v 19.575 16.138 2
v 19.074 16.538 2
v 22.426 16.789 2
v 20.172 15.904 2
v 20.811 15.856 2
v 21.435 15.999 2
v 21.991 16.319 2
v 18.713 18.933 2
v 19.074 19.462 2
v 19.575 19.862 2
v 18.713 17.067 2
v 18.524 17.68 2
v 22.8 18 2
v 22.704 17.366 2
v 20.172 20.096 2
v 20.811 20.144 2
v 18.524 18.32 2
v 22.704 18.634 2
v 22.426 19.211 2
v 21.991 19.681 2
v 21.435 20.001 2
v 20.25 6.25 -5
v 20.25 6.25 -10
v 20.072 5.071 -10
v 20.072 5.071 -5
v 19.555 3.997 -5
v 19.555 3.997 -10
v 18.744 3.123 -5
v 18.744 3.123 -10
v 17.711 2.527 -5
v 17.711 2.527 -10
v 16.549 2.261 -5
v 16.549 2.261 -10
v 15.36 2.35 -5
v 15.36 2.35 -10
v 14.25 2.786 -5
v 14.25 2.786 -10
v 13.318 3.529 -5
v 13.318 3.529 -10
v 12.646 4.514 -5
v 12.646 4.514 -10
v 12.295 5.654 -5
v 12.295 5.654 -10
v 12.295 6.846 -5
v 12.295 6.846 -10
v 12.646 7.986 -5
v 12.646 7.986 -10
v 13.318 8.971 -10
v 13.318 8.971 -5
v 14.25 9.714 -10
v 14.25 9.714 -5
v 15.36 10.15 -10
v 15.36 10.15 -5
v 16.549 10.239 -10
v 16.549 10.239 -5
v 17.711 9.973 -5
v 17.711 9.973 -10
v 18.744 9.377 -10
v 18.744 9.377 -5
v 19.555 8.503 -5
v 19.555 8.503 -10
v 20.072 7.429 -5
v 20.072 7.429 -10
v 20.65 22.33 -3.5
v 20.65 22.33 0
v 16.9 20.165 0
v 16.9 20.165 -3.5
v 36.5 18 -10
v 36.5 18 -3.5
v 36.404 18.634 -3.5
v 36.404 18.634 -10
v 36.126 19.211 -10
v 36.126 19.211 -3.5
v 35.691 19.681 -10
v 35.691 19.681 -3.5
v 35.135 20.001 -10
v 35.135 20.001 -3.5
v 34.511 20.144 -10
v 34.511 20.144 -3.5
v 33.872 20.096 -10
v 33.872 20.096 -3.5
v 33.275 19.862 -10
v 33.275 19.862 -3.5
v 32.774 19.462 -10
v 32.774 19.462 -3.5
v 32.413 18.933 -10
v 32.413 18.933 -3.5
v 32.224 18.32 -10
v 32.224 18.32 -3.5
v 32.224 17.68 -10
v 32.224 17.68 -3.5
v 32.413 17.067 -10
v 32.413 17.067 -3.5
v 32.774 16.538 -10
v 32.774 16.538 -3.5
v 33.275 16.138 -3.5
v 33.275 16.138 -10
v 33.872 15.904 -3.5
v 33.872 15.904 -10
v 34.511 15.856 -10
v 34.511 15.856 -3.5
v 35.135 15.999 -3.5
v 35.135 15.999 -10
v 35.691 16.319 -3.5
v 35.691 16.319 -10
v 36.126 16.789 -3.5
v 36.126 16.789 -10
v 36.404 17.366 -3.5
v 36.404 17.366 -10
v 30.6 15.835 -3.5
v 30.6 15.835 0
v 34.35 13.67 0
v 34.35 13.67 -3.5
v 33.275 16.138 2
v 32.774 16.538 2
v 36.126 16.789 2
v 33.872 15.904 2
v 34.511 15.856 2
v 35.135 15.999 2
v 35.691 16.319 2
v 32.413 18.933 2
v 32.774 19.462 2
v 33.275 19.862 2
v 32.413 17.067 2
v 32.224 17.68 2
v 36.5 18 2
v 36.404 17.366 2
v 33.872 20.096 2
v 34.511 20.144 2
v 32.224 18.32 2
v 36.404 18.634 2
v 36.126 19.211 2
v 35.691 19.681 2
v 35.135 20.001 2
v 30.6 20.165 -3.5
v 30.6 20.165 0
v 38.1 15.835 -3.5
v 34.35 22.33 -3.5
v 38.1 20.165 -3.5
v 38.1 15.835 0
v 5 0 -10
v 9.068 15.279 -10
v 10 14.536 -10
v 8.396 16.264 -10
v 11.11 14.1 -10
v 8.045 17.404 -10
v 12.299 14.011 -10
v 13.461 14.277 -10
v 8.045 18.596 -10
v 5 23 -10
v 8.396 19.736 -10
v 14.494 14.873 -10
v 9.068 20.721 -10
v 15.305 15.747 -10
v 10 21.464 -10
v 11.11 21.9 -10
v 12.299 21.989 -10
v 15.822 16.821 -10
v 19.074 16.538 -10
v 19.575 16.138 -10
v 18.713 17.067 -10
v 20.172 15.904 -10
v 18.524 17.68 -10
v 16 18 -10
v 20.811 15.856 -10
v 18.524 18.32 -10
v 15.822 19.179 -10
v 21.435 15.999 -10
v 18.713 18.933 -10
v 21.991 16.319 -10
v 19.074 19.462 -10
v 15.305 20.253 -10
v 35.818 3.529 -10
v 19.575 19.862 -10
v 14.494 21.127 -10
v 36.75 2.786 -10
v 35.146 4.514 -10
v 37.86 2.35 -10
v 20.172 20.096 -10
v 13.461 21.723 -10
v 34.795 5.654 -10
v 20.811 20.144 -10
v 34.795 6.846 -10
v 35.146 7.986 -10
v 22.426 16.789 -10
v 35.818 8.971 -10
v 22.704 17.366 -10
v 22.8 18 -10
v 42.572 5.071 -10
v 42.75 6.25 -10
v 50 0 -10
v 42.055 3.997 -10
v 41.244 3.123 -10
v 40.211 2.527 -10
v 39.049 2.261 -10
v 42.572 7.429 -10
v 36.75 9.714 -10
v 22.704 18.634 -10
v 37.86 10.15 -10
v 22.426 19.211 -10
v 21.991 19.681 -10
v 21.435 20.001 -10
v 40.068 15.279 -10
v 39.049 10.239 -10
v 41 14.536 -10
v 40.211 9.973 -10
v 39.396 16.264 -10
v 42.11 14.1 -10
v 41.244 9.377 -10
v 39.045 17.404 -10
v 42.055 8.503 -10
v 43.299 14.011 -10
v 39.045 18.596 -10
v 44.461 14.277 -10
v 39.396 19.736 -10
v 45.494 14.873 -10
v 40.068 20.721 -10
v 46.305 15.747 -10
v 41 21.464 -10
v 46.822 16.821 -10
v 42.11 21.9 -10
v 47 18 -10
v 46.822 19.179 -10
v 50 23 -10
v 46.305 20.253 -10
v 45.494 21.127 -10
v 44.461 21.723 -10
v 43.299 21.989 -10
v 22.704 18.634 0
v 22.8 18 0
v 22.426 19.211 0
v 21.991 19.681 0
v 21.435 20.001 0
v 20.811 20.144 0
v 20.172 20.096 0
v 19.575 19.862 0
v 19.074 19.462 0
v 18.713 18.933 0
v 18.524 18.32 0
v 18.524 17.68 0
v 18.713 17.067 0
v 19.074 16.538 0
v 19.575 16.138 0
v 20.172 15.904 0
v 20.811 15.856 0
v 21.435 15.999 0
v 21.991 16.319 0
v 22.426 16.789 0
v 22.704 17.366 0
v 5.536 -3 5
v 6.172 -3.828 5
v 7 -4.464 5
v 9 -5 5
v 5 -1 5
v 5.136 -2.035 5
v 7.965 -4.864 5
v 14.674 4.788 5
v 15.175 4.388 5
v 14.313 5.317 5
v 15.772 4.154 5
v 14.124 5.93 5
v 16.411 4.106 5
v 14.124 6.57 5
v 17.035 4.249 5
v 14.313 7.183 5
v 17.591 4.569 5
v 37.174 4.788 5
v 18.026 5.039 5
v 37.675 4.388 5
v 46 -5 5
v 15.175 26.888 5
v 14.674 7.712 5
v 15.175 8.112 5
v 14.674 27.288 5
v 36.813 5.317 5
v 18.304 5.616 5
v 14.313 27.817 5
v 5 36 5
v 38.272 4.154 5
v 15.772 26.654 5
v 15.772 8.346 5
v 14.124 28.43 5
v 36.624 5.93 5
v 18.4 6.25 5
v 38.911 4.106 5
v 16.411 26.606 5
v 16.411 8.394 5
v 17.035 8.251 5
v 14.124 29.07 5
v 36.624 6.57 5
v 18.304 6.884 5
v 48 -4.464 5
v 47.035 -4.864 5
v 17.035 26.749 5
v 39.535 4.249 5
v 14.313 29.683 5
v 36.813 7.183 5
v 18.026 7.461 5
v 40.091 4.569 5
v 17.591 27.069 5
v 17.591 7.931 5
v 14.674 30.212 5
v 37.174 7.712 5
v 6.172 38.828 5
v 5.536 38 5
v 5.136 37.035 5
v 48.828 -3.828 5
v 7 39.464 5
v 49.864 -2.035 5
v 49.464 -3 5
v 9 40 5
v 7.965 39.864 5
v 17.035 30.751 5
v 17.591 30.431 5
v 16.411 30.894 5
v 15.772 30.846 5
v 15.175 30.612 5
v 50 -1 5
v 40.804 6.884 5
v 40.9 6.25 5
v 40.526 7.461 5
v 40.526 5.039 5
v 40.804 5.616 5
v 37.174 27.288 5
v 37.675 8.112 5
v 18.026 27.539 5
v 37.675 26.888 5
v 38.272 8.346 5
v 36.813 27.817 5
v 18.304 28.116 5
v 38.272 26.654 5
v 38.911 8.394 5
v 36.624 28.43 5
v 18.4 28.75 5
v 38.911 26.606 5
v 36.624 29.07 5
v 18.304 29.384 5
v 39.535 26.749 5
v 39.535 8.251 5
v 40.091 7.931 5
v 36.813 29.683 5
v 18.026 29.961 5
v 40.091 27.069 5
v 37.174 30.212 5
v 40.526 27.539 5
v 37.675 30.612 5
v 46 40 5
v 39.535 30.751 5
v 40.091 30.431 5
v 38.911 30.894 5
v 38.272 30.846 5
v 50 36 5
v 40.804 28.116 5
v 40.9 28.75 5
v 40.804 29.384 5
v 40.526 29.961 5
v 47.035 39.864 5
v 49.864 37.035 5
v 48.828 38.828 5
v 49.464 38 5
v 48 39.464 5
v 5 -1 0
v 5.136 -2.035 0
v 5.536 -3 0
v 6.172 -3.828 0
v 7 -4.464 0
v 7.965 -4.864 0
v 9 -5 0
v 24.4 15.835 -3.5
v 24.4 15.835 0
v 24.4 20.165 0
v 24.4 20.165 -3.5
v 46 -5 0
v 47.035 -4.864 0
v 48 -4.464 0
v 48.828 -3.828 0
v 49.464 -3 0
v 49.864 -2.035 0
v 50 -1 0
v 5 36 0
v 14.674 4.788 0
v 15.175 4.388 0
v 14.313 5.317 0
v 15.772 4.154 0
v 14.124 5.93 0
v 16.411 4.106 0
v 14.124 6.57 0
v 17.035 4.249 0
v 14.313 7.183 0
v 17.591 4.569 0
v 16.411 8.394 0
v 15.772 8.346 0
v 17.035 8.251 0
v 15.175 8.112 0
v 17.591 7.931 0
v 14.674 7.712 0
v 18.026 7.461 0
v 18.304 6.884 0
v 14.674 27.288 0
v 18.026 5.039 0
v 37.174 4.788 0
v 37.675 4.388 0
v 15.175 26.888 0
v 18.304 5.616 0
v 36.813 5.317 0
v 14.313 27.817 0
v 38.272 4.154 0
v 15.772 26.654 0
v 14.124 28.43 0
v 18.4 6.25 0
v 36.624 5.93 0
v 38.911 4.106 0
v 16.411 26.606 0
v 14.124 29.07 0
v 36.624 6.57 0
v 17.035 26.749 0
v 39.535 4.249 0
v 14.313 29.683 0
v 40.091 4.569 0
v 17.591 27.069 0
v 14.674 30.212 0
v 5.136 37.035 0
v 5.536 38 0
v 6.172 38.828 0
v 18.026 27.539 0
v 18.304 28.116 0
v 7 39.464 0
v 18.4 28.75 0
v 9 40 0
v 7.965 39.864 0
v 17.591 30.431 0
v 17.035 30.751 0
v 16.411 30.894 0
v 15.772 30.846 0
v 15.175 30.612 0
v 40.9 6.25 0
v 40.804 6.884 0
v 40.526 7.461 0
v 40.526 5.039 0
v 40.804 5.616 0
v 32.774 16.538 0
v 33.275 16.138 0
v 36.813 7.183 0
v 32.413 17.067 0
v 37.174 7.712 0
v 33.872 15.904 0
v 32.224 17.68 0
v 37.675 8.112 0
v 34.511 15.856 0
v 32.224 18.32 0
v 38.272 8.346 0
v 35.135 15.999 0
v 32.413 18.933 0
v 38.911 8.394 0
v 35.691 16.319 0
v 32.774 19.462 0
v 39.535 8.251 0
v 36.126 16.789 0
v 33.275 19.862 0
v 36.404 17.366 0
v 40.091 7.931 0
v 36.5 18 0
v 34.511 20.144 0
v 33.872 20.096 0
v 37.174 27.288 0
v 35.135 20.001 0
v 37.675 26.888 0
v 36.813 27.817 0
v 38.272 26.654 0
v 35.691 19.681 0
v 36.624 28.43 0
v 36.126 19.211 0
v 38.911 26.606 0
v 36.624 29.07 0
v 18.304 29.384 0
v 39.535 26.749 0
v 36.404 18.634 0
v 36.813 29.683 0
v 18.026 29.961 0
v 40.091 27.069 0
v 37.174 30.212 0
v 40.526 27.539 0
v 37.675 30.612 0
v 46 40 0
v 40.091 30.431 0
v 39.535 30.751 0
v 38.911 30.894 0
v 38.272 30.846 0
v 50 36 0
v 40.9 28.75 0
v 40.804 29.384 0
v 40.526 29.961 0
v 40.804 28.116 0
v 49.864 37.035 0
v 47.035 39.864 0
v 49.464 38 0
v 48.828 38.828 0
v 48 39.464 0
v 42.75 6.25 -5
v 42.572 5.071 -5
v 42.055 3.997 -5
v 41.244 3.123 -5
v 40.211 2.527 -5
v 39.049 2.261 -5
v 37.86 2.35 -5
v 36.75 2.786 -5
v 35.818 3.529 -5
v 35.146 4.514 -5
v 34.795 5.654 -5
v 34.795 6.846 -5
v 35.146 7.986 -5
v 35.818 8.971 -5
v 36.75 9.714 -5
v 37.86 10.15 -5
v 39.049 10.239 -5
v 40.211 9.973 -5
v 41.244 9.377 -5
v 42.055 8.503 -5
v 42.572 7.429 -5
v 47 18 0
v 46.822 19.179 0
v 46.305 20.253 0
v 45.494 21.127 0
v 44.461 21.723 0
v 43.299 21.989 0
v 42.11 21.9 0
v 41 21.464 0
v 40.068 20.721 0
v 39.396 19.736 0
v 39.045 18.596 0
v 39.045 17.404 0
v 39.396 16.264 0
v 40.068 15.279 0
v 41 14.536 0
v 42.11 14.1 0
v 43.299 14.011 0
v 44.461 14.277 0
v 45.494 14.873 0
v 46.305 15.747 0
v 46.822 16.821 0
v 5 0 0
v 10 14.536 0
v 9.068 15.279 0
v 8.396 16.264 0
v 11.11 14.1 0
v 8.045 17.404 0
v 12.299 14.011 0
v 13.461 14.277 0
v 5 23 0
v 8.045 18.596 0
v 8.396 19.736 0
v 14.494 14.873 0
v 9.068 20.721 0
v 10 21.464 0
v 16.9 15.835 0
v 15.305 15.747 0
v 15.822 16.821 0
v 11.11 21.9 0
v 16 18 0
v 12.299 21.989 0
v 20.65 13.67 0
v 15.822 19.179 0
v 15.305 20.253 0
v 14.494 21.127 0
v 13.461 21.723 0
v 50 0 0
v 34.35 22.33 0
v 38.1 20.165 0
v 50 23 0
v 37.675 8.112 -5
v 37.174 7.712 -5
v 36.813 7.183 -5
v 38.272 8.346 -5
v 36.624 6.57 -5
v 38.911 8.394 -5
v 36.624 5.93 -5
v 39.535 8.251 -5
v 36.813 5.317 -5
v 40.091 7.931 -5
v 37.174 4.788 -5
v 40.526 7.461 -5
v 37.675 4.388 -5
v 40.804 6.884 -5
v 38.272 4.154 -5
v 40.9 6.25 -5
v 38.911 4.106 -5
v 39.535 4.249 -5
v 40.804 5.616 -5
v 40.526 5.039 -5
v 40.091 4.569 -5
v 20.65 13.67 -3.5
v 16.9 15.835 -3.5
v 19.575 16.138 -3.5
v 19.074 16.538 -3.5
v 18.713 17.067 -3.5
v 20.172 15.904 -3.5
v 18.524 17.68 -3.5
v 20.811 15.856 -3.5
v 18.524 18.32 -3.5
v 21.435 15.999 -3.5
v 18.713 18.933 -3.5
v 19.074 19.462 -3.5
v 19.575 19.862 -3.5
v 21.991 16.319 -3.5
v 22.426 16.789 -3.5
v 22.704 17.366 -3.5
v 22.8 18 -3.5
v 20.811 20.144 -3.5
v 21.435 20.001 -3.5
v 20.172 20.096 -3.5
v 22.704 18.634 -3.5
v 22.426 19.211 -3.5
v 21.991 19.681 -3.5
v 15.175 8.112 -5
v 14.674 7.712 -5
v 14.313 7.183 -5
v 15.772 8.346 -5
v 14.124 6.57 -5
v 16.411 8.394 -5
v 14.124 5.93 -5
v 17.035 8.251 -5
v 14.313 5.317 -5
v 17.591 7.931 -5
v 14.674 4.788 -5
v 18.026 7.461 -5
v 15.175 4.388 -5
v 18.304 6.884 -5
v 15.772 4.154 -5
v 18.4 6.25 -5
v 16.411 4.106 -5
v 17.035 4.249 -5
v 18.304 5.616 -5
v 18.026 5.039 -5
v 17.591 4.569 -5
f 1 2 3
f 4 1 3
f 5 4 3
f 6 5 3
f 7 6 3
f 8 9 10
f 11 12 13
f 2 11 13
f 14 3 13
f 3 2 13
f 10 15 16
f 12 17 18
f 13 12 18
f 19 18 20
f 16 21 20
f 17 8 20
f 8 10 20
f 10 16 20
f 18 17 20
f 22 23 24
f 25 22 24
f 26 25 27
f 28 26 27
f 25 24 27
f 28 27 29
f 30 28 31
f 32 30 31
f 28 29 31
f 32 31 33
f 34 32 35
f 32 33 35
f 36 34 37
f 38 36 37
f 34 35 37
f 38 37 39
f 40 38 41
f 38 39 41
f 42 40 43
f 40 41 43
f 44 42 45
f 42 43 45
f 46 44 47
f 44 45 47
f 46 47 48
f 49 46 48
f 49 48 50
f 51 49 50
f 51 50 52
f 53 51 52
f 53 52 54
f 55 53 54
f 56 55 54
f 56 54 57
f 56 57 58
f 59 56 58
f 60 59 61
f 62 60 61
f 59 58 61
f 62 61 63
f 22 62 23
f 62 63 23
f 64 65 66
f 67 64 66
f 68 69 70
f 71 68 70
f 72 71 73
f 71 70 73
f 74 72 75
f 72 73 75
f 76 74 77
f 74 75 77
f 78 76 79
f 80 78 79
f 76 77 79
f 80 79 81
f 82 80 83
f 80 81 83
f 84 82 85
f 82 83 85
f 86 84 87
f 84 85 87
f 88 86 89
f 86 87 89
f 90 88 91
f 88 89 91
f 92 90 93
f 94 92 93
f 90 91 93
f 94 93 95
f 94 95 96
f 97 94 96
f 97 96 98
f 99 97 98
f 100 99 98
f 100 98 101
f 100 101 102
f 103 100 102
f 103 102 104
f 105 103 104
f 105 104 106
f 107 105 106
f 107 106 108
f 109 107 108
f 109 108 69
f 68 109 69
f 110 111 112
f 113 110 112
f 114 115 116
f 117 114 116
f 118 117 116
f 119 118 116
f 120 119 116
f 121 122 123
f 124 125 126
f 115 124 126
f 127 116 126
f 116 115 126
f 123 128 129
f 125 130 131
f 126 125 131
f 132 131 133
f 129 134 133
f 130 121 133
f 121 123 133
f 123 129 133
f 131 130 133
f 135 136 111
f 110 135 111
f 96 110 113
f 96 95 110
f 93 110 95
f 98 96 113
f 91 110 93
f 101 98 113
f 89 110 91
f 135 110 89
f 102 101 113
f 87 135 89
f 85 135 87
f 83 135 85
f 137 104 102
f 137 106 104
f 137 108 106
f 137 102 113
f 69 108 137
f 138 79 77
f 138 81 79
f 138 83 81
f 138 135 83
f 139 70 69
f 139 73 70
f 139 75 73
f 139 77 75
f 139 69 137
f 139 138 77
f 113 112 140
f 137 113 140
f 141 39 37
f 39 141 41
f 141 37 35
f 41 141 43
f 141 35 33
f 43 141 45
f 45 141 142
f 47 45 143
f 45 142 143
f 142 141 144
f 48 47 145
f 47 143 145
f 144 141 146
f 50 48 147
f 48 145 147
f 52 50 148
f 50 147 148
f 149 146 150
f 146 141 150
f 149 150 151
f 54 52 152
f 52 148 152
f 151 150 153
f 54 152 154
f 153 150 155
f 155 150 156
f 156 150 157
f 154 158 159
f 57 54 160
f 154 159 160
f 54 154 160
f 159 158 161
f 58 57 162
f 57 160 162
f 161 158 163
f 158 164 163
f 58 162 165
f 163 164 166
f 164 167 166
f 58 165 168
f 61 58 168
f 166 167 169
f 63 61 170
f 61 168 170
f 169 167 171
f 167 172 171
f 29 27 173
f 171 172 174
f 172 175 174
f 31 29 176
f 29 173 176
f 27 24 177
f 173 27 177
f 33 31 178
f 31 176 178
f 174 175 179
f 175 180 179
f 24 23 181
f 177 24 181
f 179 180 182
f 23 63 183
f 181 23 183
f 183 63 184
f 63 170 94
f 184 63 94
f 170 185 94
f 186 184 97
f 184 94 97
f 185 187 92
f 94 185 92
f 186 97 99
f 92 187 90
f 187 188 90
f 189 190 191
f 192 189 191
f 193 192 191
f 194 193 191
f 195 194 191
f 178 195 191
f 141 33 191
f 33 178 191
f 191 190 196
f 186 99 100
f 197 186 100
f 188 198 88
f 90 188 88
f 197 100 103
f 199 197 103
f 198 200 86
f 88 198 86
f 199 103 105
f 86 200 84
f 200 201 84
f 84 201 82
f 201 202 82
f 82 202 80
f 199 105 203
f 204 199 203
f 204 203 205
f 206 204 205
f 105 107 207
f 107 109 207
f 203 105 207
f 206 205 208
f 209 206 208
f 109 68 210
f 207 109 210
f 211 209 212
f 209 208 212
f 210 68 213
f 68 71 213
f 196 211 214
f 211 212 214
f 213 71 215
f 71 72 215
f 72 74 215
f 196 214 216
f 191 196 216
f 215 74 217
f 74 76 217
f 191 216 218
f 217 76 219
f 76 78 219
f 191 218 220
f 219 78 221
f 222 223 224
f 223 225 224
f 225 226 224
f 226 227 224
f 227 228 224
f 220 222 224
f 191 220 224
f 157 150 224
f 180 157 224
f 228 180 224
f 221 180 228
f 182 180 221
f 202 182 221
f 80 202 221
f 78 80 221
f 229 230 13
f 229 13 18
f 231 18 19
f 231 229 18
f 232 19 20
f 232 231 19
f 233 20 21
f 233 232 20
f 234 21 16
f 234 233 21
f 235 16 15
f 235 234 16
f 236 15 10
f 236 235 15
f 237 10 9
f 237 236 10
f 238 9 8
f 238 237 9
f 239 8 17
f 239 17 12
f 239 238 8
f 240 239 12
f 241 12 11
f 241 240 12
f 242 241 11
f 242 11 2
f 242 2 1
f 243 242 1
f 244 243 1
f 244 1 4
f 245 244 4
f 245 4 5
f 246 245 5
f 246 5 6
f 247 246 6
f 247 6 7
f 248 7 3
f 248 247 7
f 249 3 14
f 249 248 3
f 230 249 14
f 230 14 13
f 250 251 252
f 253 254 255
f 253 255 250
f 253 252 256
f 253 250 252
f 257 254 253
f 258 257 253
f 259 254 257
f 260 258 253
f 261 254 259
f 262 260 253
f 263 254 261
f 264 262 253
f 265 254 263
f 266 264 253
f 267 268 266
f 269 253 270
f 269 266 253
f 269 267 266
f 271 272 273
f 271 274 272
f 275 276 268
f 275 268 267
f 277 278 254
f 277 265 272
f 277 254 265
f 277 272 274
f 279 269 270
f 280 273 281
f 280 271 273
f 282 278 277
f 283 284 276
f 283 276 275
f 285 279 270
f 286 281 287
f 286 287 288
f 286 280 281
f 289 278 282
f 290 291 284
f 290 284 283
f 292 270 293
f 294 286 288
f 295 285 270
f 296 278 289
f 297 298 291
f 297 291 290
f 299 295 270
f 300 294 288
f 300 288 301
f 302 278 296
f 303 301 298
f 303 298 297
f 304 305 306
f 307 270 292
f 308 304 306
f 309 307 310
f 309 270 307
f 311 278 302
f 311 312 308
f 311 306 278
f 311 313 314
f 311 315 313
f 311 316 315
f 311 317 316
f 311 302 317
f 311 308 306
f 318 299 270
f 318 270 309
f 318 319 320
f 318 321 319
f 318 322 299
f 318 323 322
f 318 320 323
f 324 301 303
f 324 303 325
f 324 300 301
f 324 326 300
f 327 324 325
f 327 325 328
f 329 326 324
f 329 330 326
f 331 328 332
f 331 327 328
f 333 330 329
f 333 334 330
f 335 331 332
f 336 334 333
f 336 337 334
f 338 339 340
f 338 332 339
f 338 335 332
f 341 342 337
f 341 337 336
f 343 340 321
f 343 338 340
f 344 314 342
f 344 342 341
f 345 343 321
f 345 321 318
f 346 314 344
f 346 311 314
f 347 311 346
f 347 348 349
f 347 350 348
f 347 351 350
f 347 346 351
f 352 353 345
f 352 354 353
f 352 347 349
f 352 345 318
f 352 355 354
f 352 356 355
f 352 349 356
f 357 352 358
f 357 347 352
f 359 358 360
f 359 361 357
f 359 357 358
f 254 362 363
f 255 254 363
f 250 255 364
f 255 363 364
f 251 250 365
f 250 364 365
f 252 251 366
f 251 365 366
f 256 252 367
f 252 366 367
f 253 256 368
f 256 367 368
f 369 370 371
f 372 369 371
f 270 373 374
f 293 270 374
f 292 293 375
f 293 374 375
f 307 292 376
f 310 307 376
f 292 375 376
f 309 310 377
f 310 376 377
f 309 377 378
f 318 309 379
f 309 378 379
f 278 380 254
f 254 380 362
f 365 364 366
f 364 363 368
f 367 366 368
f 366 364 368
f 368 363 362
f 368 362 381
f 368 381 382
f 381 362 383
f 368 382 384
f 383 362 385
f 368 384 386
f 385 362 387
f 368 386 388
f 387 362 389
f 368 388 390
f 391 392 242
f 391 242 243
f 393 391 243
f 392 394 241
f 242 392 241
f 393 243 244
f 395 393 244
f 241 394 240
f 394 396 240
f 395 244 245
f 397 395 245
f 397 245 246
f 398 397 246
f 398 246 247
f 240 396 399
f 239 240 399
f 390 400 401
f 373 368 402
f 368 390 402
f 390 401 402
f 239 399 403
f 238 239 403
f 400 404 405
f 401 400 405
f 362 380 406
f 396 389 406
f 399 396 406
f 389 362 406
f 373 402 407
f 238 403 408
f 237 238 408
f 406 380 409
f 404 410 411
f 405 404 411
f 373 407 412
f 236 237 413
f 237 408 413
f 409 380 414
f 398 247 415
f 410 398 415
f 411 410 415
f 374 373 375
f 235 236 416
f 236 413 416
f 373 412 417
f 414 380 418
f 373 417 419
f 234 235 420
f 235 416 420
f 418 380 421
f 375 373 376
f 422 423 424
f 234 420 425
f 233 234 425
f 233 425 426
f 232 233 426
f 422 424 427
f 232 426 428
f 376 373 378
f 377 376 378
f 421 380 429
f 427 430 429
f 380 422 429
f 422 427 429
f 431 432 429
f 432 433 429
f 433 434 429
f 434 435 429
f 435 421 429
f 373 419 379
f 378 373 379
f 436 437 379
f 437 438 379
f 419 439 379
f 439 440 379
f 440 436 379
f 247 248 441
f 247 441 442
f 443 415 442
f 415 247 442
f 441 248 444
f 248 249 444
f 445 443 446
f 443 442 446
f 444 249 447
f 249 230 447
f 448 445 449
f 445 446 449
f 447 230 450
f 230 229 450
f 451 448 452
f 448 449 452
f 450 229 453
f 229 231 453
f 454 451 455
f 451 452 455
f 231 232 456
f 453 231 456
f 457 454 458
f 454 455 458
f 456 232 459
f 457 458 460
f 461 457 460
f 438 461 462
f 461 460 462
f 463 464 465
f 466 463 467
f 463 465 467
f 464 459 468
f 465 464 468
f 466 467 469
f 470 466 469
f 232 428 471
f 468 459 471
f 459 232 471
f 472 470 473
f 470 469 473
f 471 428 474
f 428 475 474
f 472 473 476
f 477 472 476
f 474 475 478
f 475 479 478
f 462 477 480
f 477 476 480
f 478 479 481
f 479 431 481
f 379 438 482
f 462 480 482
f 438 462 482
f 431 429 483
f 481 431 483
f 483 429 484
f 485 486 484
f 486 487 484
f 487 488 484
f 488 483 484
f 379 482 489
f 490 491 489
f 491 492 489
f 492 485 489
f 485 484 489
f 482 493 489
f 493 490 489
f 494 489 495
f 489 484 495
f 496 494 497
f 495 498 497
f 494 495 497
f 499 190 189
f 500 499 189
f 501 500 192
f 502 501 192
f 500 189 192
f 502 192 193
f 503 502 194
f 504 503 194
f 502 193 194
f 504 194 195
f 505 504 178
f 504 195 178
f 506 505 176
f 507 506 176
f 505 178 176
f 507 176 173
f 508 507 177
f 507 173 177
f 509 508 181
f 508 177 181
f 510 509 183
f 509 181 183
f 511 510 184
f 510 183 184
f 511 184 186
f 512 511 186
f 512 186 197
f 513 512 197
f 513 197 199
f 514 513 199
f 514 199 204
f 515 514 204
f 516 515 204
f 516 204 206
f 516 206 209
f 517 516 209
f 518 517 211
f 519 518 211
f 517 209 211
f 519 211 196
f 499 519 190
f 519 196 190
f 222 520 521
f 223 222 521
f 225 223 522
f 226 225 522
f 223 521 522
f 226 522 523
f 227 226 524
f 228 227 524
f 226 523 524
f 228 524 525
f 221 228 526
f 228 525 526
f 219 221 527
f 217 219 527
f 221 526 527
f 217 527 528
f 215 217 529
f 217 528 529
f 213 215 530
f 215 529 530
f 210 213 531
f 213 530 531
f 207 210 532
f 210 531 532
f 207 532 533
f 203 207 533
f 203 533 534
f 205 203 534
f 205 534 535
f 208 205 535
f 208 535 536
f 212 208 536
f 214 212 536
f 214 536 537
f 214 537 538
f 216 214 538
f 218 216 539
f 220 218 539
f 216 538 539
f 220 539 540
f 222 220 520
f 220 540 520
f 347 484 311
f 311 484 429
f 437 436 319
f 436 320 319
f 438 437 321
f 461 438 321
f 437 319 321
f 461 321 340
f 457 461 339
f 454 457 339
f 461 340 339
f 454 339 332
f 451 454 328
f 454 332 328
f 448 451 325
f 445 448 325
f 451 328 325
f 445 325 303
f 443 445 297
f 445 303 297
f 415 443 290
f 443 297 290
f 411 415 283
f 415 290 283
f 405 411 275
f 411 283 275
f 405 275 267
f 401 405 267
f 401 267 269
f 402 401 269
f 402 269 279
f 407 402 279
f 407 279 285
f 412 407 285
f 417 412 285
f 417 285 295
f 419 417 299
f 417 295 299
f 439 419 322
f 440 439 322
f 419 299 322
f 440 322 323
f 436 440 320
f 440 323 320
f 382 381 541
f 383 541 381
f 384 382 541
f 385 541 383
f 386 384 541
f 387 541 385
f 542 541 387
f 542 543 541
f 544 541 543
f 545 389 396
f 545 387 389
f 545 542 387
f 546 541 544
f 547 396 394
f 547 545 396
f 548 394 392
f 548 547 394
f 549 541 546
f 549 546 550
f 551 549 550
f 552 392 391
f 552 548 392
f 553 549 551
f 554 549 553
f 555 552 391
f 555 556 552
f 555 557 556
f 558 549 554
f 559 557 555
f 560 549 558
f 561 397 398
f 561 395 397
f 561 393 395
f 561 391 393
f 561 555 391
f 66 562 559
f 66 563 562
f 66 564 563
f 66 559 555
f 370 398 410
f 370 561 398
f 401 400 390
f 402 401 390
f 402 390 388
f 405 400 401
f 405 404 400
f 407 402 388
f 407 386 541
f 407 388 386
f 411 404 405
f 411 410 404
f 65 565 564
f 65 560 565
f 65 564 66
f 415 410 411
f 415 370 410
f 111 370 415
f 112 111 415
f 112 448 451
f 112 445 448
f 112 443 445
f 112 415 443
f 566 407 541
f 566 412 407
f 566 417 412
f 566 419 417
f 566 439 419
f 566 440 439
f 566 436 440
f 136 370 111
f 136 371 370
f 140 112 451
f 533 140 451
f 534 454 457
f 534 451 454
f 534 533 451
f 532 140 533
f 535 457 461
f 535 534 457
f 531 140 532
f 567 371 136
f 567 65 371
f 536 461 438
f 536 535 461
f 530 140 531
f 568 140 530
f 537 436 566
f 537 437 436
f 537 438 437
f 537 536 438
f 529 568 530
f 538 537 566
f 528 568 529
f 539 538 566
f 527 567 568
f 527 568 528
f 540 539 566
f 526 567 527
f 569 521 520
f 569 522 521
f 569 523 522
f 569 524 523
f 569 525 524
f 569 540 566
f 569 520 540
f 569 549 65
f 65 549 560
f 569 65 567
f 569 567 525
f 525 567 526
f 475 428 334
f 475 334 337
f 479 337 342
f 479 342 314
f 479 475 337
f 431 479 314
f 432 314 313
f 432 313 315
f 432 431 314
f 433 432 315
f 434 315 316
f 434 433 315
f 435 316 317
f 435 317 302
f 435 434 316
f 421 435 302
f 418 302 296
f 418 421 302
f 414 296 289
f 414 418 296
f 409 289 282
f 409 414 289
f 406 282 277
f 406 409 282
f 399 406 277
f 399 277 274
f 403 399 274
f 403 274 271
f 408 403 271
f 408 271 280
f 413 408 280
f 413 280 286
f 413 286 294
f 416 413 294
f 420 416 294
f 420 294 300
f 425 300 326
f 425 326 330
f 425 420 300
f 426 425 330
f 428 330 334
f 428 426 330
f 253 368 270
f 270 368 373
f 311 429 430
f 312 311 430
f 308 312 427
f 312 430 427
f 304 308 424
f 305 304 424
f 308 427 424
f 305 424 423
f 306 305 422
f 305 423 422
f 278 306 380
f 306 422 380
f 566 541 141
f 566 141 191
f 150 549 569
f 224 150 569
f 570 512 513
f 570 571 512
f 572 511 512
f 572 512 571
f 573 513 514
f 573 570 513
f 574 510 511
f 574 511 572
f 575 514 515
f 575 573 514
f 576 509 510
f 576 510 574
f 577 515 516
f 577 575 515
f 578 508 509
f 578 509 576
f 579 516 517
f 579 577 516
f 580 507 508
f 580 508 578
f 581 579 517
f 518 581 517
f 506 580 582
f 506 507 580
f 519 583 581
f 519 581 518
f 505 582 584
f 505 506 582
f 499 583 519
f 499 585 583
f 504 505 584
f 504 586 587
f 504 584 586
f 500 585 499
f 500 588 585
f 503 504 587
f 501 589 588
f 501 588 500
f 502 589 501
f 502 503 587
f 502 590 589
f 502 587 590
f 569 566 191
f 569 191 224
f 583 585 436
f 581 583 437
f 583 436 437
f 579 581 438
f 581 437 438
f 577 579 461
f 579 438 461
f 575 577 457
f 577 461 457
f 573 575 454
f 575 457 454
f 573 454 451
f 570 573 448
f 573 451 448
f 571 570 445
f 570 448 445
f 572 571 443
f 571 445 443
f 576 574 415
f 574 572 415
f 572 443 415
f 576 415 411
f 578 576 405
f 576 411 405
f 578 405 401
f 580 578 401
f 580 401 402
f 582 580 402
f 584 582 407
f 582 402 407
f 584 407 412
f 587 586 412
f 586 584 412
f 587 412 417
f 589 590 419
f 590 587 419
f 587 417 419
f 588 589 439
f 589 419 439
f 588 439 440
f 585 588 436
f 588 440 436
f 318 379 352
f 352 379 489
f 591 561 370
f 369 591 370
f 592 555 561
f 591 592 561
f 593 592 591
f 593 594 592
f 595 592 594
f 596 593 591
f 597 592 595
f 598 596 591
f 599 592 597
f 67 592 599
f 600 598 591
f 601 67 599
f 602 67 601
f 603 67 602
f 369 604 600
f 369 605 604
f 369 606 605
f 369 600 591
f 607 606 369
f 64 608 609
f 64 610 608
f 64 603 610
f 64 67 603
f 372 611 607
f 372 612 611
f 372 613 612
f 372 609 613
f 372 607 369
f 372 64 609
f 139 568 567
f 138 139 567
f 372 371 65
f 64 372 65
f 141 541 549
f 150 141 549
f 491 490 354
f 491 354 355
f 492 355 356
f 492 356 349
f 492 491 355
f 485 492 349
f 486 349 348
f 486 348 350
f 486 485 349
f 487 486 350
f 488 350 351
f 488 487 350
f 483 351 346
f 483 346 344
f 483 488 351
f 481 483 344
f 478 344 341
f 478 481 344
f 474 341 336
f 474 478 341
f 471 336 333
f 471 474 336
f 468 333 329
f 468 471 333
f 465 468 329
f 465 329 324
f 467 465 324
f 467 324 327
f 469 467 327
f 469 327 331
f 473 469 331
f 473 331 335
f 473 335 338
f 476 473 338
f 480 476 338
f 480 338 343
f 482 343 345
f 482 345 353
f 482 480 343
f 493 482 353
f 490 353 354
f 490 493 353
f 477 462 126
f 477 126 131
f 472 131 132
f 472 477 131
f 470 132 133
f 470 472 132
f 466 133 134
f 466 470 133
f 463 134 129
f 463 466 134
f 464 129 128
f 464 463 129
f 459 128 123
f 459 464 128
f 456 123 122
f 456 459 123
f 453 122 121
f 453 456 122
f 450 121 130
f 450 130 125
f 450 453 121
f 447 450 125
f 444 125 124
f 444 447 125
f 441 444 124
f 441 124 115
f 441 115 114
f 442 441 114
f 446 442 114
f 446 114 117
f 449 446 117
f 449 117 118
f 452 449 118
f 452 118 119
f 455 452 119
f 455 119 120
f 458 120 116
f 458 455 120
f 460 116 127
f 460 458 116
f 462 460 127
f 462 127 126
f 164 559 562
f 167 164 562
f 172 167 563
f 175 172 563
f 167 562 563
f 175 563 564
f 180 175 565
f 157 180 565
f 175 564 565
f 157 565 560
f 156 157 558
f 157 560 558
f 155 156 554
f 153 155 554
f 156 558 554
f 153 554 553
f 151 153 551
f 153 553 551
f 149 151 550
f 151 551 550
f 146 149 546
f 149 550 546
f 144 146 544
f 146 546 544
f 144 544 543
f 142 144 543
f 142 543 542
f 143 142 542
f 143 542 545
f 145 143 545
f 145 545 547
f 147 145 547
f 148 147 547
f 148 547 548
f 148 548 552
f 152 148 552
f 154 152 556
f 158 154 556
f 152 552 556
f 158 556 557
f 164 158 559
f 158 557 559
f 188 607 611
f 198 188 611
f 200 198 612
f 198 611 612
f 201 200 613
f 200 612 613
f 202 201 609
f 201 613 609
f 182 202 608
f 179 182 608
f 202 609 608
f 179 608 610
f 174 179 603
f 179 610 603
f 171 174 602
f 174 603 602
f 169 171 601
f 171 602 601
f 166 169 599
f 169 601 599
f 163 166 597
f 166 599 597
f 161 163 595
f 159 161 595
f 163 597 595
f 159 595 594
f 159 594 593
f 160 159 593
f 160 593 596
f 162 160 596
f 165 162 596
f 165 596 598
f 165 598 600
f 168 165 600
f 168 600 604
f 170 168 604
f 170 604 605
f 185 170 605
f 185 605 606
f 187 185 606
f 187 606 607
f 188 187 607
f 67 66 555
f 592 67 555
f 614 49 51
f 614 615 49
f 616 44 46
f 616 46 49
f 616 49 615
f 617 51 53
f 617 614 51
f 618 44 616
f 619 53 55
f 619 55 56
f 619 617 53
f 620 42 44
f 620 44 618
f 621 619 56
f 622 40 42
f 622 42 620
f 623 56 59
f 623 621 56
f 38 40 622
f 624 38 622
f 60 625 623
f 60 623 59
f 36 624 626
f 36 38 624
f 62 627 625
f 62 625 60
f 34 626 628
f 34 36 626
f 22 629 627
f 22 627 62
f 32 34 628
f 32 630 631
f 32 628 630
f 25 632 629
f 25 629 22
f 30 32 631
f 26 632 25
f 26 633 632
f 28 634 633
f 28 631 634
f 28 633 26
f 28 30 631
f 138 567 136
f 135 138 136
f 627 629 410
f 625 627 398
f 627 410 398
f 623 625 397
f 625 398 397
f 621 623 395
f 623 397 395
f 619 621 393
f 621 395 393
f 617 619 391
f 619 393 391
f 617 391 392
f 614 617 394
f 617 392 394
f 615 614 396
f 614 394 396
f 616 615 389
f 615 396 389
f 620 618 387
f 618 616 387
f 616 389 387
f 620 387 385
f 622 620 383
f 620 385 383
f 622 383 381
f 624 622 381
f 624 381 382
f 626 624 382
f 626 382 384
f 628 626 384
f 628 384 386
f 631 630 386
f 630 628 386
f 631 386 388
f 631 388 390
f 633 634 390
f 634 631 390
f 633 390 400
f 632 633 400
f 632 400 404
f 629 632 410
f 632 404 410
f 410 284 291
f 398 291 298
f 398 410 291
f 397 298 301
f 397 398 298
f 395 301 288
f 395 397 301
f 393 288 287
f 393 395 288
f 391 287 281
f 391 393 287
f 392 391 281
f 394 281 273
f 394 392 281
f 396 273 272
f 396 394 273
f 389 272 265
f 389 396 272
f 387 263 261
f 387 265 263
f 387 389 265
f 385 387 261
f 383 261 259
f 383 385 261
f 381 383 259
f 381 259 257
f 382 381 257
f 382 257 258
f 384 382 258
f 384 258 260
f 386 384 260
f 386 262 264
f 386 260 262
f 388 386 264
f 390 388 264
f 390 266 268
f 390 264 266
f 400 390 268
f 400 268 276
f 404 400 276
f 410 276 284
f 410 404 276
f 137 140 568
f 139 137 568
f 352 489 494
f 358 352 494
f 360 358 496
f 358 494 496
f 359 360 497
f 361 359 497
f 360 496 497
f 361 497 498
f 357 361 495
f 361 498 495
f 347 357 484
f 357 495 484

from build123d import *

# Parameters (mm, degrees)
F0_R     = 2.15
F2_DEPTH = 5
F1_W     = 45
F1_H     = 23
F1_R     = 4
F1_R_2   = 2.15
F3_DEPTH = 10
F4_DEPTH = 3.5
F5_DEPTH = 2
F6_DEPTH = 10
F7_R     = 4
F7_R_2   = 2.15
F8_DEPTH = 5


# Not quite as in the source:
# - a feature names something its author has since deleted; it is built from what else it names


with BuildPart() as f2:
    # F0 (on Top) → F2 (new body)
    with BuildSketch(Plane.XY):
        with BuildLine():
            ThreePointArc((5, -1), (6.1715728753, -3.8284271247), (9, -5))
            Line((9, -5), (46, -5))
            ThreePointArc((46, -5), (48.8284271247, -3.8284271247), (50, -1))
            Line((50, -1), (50, 36))
            ThreePointArc((50, 36), (48.8284271247, 38.8284271247), (46, 40))
            Line((46, 40), (9, 40))
            ThreePointArc((9, 40), (6.1715728753, 38.8284271247), (5, 36))
            Line((5, 36), (5, -1))
        make_face()
        with Locations((16.25, 6.25)):
            Circle(F0_R, mode=Mode.SUBTRACT)
        with Locations((38.75, 6.25)):
            Circle(F0_R, mode=Mode.SUBTRACT)
        with Locations((16.25, 28.75)):
            Circle(F0_R, mode=Mode.SUBTRACT)
        with Locations((38.75, 28.75)):
            Circle(F0_R, mode=Mode.SUBTRACT)
        with Locations((16.25, 6.25)):
            Circle(F0_R)
        with Locations((38.75, 6.25)):
            Circle(F0_R)
    extrude(amount=F2_DEPTH)

    # F1 (on Top) → F5 (cut)
    with BuildSketch(Plane.XY):
        with Locations((34.35, 18)):
            Circle(F1_R_2)
        with Locations((20.65, 18)):
            Circle(F1_R_2)
    extrude(amount=F5_DEPTH, mode=Mode.SUBTRACT)


with BuildPart() as f3:
    # F1 (on Top) → F3 (new body)
    with BuildSketch(Plane.XY):
        with Locations((27.5, 11.5)):
            Rectangle(F1_W, F1_H)
        with Locations((12, 18)):
            Circle(F1_R, mode=Mode.SUBTRACT)
        Polygon((20.65, 22.3301270189), (24.4, 20.1650635095), (24.4, 15.8349364905), (20.65, 13.6698729811), (16.9, 15.8349364905), (16.9, 20.1650635095), align=None, mode=Mode.SUBTRACT)
        Polygon((34.35, 13.6698729811), (30.6, 15.8349364905), (30.6, 20.1650635095), (34.35, 22.3301270189), (38.1, 20.1650635095), (38.1, 15.8349364905), align=None, mode=Mode.SUBTRACT)
        with Locations((43, 18)):
            Circle(F1_R, mode=Mode.SUBTRACT)
        Polygon((24.4, 15.8349364905), (24.4, 20.1650635095), (20.65, 22.3301270189), (16.9, 20.1650635095), (16.9, 15.8349364905), (20.65, 13.6698729811), align=None)
        with Locations((20.65, 18)):
            Circle(F1_R_2, mode=Mode.SUBTRACT)
        Polygon((30.6, 20.1650635095), (30.6, 15.8349364905), (34.35, 13.6698729811), (38.1, 15.8349364905), (38.1, 20.1650635095), (34.35, 22.3301270189), align=None)
        with Locations((34.35, 18)):
            Circle(F1_R_2, mode=Mode.SUBTRACT)
    extrude(amount=-F3_DEPTH)

    # F1 (on Top) → F4 (cut)
    with BuildSketch(Plane.XY):
        Polygon((24.4, 15.8349364905), (24.4, 20.1650635095), (20.65, 22.3301270189), (16.9, 20.1650635095), (16.9, 15.8349364905), (20.65, 13.6698729811), align=None)
        with Locations((20.65, 18)):
            Circle(F1_R_2, mode=Mode.SUBTRACT)
        Polygon((30.6, 20.1650635095), (30.6, 15.8349364905), (34.35, 13.6698729811), (38.1, 15.8349364905), (38.1, 20.1650635095), (34.35, 22.3301270189), align=None)
        with Locations((34.35, 18)):
            Circle(F1_R_2, mode=Mode.SUBTRACT)
    extrude(amount=-F4_DEPTH, mode=Mode.SUBTRACT)


with BuildPart() as f6_tool:
    # F0 (on Top) → F6 (new body, symmetric)
    with BuildSketch(Plane.XY):
        with Locations((16.25, 6.25)):
            Circle(F0_R)
        with Locations((38.75, 6.25)):
            Circle(F0_R)
    extrude(amount=F6_DEPTH, both=True)


with BuildPart() as f2_1:
    add(f2.part)

    # F6: cut by f6_tool
    add(f6_tool.part, mode=Mode.SUBTRACT)


with BuildPart() as f3_1:
    add(f3.part)

    # F6: cut by f6_tool
    add(f6_tool.part, mode=Mode.SUBTRACT)

    # F7 (on face) → F8 (cut)
    with BuildSketch(Plane(origin=(0, 0, -10), x_dir=(1, 0, 0), z_dir=(0, 0, -1))):
        with Locations((16.25, -6.25)):
            Circle(F7_R)
        with Locations((16.25, -6.25)):
            Circle(F7_R_2, mode=Mode.SUBTRACT)
        with Locations((38.75, -6.25)):
            Circle(F7_R)
        with Locations((38.75, -6.25)):
            Circle(F7_R_2, mode=Mode.SUBTRACT)
    extrude(amount=-F8_DEPTH, mode=Mode.SUBTRACT)


solid = Compound([f2_1.part, f3_1.part])
